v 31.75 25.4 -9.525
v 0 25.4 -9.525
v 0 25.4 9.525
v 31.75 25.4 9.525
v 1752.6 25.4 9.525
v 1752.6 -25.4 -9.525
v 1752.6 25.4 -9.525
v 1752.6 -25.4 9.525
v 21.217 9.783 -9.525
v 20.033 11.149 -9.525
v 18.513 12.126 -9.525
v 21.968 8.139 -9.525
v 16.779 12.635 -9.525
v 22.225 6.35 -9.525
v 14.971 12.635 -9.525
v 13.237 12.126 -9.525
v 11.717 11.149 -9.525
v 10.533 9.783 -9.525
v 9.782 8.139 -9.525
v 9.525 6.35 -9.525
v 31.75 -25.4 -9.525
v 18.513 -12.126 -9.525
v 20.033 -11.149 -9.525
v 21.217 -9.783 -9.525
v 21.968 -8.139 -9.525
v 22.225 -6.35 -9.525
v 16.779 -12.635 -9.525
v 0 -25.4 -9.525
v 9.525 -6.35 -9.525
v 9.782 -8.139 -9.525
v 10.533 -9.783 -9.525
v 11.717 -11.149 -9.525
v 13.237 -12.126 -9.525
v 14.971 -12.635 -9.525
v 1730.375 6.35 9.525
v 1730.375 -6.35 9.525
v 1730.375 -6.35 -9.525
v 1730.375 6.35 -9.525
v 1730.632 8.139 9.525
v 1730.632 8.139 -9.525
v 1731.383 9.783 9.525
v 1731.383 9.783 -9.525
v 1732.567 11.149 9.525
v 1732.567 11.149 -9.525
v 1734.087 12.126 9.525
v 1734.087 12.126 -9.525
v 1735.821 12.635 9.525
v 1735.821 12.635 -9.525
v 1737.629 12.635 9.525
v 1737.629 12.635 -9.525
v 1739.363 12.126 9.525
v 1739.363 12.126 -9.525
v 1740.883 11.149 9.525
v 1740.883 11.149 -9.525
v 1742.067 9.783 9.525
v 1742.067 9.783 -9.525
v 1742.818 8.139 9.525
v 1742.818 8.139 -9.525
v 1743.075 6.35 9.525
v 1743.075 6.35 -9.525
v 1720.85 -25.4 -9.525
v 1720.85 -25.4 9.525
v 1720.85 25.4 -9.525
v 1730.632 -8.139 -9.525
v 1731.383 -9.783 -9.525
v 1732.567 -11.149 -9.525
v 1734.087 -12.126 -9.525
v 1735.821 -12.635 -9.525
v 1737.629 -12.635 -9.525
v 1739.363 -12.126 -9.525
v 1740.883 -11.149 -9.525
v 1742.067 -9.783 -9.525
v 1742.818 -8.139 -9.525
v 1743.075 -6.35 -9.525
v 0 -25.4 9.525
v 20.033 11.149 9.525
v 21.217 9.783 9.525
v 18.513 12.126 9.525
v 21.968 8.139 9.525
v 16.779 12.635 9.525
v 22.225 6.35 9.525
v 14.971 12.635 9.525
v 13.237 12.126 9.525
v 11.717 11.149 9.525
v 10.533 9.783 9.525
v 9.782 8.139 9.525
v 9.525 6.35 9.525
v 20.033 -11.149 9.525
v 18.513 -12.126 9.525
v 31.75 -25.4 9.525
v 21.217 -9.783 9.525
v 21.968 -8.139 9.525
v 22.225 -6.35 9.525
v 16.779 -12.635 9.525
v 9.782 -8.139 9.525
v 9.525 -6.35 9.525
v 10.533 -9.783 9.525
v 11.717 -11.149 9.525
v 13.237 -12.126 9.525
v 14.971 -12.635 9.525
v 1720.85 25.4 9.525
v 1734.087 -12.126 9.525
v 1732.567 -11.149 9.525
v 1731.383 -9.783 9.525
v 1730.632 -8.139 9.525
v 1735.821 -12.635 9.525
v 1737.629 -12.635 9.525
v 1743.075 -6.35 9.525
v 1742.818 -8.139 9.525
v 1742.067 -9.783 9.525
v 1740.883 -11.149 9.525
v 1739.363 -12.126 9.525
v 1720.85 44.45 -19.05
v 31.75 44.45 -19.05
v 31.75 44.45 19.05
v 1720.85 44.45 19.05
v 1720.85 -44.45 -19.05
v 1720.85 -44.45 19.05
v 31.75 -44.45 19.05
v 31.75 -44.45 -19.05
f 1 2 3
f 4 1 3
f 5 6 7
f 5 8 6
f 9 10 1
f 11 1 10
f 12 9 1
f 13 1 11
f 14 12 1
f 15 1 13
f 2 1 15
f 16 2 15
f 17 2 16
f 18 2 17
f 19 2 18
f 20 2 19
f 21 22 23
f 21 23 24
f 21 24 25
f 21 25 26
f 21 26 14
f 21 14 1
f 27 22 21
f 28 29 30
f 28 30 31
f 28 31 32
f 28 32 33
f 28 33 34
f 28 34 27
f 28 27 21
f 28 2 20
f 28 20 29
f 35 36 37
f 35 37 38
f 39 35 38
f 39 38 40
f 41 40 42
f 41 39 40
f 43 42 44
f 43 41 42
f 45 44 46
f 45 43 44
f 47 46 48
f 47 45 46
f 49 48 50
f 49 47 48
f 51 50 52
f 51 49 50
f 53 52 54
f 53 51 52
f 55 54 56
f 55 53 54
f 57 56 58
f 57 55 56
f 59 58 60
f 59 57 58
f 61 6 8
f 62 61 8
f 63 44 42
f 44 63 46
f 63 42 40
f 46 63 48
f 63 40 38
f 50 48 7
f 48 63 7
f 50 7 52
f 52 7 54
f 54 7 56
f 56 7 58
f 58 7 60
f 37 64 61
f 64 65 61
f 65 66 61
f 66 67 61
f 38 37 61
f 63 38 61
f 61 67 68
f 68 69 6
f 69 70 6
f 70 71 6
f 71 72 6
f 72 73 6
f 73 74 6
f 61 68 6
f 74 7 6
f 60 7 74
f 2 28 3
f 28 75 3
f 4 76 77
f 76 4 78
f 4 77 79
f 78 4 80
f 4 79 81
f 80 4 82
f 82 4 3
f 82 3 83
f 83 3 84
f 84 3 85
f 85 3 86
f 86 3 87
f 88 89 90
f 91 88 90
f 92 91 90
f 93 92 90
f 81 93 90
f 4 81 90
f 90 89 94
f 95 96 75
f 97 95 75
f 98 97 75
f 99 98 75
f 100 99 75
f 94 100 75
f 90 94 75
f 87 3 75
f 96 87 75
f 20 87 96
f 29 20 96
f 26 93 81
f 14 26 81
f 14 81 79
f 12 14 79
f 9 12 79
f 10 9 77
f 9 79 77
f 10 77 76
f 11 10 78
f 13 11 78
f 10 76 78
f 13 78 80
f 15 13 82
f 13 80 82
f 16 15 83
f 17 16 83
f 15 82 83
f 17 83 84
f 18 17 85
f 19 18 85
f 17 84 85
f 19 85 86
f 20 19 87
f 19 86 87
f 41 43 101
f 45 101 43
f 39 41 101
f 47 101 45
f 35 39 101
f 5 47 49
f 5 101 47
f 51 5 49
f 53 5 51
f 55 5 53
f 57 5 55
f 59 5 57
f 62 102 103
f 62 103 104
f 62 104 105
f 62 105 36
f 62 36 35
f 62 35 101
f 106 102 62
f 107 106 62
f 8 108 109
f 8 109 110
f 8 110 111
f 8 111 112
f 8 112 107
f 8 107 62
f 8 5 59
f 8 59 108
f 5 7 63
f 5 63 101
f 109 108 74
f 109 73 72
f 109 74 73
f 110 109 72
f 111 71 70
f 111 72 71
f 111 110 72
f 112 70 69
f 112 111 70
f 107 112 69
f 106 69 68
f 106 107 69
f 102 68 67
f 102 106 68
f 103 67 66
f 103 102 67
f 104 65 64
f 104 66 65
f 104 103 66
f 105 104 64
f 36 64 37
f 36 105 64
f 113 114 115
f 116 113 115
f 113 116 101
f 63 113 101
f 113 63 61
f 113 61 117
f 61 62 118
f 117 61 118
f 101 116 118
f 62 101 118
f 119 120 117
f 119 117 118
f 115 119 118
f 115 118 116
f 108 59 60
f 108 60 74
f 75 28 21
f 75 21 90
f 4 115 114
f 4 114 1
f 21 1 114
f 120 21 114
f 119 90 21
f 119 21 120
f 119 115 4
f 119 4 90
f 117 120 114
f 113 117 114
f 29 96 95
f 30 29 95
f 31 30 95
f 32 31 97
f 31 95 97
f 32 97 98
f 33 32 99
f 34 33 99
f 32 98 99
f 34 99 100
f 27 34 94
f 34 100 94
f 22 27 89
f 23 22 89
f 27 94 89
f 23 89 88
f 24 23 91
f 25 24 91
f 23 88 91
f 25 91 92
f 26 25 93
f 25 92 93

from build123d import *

# Parameters (mm, degrees)
F0_W     = 88.9
F0_H     = 38.1
F1_DEPTH = 1752.6
F3_W     = 88.9
F3_H     = 38.1
F3_W_2   = 50.8
F3_H_2   = 19.05
F4_DEPTH = 31.75
F6_DEPTH = 28.576


# Not quite as in the source:
# - a pattern or mirror of a feature is missing from the dataset's text; its kind, count and spacing are read off the source's solid


with BuildPart() as f1:
    # F0 (on Right) → F1 (new body)
    with BuildSketch(Plane.YZ):
        Rectangle(F0_W, F0_H)
    extrude(amount=F1_DEPTH)

    # F3 (on face) → F4 (cut)
    with BuildSketch(Plane(origin=(0, 0, 0), x_dir=(0, -1, 0), z_dir=(-1, 0, 0))):
        Rectangle(F3_W, F3_H)
        Rectangle(F3_W_2, F3_H_2, mode=Mode.SUBTRACT)
    f4 = extrude(amount=-F4_DEPTH, mode=Mode.SUBTRACT)

    # F4_copies: F4 across plane
    add(f4.mirror(Plane(origin=(876.3, 0, 0), x_dir=(0, 0, 1), z_dir=(1, 0, 0))), mode=Mode.SUBTRACT)

    # F5 (on face) → F6 (cut, through all)
    with BuildSketch(Plane.XY.offset(9.525)):
        with BuildLine():
            Line((9.525, 6.35), (9.525, -6.35))
            ThreePointArc((9.525, -6.35), (15.875, -12.7), (22.225, -6.35))
            Line((22.225, -6.35), (22.225, 6.35))
            ThreePointArc((22.225, 6.35), (15.875, 12.7), (9.525, 6.35))
        make_face()
    f6 = extrude(amount=-F6_DEPTH, mode=Mode.SUBTRACT)

    # F6_copies: F6 across plane
    add(f6.mirror(Plane(origin=(876.3, 0, 0), x_dir=(0, 0, 1), z_dir=(1, 0, 0))), mode=Mode.SUBTRACT)


solid = f1.part
